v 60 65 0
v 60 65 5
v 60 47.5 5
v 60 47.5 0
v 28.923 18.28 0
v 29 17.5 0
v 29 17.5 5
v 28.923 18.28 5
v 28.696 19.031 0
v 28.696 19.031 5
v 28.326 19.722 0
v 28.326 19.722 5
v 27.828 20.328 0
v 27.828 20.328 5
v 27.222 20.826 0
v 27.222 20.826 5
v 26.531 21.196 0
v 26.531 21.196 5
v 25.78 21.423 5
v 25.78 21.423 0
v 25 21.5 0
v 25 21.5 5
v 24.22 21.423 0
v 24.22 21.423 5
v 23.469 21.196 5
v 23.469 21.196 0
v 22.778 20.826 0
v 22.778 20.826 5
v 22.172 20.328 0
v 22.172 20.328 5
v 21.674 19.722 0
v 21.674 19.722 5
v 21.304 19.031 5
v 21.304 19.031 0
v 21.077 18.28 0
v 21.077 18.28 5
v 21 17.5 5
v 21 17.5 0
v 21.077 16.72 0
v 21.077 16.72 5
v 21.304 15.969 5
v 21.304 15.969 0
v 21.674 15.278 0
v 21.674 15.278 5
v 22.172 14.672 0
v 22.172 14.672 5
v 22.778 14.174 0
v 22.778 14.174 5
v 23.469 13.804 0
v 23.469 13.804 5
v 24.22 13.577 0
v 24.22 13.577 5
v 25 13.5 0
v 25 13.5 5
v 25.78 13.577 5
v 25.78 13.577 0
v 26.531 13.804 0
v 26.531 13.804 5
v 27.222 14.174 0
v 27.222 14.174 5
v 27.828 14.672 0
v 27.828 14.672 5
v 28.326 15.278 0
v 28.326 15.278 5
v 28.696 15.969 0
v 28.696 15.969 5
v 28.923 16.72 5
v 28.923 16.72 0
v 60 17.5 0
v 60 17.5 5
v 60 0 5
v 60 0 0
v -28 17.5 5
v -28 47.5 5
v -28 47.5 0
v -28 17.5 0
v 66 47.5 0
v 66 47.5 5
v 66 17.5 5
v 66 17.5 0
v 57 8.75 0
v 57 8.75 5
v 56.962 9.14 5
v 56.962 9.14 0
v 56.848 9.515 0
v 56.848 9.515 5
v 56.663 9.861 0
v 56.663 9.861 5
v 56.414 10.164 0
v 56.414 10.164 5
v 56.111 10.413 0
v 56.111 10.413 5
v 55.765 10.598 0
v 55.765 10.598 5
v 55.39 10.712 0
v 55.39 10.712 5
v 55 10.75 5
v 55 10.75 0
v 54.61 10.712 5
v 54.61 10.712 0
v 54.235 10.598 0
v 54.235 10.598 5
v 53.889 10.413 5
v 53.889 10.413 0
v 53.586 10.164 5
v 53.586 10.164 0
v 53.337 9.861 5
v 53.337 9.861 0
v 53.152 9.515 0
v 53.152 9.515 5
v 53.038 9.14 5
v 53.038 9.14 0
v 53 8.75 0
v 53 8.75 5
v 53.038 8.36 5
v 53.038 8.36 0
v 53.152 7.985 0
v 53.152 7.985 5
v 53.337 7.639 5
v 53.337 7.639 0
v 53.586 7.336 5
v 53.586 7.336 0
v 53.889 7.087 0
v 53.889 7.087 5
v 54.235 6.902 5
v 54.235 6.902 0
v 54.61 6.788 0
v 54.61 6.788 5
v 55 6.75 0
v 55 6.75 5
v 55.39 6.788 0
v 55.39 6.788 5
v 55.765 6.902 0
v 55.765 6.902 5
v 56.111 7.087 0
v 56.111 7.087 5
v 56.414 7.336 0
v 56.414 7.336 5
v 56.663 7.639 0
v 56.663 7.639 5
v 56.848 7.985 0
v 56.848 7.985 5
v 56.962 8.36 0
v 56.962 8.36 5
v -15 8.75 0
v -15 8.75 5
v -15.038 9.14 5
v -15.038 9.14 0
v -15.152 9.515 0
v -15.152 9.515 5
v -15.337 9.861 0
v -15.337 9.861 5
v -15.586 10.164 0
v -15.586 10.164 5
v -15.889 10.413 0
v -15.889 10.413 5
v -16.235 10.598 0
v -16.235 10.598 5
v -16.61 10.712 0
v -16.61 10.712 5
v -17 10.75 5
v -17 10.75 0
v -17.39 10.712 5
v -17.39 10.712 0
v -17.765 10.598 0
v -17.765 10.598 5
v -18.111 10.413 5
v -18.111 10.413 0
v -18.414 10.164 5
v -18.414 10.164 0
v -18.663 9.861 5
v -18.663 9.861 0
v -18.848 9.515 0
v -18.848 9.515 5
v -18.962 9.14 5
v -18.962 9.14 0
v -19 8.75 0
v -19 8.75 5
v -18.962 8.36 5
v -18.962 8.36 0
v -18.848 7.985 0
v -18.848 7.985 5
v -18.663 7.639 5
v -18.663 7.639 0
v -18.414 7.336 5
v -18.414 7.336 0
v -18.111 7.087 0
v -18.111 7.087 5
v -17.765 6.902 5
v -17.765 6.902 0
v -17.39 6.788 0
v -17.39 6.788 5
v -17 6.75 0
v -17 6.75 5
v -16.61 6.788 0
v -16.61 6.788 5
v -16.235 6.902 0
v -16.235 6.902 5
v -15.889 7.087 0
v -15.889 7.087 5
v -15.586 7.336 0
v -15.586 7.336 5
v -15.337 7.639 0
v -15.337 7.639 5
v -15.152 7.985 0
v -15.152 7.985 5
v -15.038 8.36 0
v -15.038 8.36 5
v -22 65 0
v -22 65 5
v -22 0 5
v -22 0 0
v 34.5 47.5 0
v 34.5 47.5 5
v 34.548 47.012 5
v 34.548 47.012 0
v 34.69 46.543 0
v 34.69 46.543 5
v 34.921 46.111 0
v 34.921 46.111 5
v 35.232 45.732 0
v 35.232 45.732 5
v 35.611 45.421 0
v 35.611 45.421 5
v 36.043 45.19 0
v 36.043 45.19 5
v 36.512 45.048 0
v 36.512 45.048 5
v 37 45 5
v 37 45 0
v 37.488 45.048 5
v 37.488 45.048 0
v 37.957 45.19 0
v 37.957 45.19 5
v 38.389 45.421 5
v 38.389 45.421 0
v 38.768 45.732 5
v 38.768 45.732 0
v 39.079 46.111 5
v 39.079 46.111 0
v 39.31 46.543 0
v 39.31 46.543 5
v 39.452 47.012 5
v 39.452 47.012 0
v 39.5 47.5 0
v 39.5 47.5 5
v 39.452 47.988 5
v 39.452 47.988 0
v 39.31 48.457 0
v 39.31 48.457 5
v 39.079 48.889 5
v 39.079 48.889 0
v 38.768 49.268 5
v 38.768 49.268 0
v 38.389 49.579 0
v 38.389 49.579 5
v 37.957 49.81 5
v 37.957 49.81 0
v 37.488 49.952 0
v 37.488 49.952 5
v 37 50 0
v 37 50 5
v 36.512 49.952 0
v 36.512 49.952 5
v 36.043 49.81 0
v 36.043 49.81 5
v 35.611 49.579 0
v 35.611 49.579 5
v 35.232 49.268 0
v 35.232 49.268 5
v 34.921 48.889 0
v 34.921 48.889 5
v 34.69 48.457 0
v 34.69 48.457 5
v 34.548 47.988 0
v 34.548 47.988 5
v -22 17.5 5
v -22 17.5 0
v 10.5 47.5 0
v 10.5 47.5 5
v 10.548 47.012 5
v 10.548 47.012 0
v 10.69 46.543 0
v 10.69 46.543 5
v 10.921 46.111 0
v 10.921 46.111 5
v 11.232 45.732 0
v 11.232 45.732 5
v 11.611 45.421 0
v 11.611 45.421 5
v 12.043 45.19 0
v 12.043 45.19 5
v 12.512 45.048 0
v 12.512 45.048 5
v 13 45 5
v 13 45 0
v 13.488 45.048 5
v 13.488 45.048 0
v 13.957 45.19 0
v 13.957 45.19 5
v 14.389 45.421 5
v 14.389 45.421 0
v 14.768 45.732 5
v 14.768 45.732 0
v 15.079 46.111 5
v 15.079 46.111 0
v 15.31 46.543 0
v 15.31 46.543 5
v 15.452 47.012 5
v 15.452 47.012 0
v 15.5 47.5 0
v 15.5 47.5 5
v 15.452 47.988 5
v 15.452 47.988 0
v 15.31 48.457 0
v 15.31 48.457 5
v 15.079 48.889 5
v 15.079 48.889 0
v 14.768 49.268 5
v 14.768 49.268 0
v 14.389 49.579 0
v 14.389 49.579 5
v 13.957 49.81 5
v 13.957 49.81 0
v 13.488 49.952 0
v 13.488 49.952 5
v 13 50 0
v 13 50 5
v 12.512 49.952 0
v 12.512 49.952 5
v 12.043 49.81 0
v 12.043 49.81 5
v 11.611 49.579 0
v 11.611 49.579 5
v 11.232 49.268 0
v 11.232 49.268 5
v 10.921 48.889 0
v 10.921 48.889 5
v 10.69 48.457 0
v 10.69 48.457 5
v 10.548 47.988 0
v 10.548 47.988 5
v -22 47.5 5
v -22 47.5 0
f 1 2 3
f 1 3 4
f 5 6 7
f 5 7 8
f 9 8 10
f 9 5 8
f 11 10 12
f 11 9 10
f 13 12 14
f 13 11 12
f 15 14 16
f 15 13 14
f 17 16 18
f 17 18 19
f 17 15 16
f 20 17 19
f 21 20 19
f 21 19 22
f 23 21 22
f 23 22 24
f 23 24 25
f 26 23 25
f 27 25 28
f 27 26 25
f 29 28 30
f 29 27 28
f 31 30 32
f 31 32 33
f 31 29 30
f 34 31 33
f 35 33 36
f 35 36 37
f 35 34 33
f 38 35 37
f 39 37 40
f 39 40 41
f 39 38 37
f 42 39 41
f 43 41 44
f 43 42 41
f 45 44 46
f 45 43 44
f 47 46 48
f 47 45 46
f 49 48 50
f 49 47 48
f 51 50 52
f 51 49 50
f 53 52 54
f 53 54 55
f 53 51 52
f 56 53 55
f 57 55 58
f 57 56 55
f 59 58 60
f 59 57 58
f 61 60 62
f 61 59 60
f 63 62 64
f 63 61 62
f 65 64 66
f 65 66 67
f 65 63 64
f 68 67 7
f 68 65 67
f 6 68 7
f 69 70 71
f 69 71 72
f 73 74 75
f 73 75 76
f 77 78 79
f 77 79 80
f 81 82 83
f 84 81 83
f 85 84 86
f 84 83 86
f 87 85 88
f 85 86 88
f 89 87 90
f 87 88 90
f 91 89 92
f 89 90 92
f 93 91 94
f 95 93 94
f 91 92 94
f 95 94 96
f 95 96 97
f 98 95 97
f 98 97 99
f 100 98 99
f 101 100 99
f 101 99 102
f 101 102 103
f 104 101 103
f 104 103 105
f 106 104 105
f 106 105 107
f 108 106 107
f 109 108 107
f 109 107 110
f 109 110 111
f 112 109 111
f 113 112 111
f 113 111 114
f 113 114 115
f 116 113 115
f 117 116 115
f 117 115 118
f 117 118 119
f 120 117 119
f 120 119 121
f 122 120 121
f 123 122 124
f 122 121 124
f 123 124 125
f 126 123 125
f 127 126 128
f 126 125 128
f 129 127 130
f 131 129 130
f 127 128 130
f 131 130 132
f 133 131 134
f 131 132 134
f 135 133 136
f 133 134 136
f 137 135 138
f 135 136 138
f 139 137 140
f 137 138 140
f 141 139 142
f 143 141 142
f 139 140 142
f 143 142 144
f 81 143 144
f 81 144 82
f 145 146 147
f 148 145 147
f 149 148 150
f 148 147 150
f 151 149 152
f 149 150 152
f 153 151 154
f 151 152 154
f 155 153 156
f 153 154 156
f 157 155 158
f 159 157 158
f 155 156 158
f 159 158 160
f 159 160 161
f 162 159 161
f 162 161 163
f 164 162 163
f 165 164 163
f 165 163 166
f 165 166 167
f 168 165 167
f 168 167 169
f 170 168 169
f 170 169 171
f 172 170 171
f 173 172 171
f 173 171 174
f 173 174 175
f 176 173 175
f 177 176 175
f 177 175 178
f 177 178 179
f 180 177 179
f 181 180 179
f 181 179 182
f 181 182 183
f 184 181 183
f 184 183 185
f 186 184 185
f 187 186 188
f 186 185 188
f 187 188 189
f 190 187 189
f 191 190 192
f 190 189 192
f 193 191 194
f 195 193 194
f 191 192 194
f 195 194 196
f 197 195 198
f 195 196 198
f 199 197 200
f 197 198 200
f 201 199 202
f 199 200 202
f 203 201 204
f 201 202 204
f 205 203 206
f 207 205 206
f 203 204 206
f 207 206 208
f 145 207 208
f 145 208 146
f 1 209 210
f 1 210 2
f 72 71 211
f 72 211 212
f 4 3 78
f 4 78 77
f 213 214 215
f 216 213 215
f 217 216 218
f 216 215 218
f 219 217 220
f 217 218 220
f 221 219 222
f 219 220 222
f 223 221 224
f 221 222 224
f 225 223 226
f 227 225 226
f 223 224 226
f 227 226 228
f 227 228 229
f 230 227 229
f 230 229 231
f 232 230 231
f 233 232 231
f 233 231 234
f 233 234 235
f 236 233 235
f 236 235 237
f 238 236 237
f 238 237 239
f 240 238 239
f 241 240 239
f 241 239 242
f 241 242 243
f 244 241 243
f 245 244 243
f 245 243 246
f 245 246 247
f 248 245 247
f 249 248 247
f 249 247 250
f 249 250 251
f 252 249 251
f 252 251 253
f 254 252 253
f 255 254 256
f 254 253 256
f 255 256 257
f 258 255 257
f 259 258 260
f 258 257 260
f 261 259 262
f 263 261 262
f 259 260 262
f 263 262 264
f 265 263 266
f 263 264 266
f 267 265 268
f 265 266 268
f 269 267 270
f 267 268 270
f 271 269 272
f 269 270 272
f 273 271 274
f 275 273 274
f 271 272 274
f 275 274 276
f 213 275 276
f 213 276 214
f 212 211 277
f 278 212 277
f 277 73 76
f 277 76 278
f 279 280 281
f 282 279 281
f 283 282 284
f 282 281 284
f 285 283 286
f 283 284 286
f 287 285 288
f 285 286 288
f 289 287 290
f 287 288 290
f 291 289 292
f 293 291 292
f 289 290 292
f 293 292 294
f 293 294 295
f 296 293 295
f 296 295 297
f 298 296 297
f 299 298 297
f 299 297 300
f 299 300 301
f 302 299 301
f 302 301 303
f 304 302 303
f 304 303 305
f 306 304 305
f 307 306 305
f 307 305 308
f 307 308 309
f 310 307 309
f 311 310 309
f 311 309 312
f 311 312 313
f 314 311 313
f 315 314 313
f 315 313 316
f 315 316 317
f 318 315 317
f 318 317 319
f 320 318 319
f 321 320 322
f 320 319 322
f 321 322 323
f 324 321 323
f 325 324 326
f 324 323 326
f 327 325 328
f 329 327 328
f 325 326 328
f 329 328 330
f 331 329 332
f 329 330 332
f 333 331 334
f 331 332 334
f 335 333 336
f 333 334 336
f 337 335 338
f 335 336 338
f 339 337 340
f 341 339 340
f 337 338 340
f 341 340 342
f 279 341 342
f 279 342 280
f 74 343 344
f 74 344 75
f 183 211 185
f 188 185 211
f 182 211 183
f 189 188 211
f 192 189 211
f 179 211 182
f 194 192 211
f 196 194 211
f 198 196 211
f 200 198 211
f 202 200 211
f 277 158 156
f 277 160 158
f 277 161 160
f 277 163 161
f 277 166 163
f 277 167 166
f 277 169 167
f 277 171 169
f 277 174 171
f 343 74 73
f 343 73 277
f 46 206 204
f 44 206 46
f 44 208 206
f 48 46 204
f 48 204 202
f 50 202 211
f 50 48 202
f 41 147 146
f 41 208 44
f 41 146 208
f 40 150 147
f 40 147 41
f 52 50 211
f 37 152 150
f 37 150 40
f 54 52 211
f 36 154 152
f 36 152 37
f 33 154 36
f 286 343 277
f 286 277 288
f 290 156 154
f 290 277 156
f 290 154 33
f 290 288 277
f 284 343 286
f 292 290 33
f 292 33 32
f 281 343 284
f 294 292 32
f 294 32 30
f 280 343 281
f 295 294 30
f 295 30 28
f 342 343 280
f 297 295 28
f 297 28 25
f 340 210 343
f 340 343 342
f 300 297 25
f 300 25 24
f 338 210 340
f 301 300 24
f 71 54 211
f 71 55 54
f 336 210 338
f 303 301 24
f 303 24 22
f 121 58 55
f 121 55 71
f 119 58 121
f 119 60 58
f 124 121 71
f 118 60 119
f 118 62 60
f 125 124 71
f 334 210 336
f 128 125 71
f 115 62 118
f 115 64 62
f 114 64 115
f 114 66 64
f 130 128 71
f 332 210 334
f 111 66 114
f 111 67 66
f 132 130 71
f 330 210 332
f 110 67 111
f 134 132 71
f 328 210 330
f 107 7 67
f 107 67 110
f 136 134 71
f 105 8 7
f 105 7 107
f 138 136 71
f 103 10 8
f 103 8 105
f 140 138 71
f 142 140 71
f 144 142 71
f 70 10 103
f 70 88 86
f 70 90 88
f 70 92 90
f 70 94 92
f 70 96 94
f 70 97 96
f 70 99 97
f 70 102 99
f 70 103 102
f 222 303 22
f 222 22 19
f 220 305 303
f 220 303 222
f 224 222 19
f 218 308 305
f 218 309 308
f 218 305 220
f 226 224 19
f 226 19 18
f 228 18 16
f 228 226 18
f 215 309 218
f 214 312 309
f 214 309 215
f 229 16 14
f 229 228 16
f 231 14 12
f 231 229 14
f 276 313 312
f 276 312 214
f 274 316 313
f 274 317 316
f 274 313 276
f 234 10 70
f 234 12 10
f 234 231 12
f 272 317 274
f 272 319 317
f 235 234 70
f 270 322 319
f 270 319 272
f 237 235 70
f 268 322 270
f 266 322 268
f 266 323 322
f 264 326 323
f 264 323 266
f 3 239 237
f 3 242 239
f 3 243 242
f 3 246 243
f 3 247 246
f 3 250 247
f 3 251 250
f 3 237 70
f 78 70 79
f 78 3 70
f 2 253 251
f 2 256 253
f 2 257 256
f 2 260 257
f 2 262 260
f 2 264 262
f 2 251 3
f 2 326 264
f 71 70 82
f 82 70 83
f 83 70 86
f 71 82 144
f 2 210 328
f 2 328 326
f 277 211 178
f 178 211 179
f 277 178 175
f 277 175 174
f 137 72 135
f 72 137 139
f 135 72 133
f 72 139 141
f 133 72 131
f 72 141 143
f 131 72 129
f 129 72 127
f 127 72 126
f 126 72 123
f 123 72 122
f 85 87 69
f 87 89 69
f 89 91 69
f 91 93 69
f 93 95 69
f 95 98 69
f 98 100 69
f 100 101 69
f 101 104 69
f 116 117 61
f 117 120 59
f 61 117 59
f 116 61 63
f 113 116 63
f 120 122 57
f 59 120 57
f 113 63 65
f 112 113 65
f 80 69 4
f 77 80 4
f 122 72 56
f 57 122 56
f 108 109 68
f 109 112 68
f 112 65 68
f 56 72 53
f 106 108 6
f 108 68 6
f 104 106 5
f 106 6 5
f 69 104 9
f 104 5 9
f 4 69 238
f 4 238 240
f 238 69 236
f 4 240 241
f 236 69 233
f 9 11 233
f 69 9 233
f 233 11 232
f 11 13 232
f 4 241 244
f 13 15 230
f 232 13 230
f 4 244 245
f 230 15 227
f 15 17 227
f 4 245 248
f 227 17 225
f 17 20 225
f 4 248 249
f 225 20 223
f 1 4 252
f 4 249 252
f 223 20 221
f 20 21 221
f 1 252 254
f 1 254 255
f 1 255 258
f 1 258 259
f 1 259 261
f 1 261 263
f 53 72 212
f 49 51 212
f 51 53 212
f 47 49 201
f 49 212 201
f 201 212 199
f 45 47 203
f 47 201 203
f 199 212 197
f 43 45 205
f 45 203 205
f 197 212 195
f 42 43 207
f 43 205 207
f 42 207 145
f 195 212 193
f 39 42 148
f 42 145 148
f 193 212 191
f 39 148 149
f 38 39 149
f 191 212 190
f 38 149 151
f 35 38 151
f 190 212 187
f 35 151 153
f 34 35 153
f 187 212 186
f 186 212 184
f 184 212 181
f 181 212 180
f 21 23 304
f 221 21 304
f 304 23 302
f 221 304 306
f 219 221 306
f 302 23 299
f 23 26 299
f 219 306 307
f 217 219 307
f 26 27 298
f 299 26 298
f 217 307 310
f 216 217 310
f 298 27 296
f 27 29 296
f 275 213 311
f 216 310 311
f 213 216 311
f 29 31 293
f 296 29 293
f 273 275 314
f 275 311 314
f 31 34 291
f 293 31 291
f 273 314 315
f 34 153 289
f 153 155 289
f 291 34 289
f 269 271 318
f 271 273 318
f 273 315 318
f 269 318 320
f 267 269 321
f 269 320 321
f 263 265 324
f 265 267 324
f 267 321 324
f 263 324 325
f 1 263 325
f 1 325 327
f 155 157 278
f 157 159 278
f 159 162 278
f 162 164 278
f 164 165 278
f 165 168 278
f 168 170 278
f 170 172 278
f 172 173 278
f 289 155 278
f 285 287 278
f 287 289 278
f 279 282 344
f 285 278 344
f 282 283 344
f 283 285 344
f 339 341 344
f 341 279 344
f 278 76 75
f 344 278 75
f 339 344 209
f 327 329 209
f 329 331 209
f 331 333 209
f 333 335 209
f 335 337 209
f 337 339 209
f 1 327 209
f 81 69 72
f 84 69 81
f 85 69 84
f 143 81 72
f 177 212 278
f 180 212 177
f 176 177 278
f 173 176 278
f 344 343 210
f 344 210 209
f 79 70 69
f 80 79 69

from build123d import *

# Parameters (mm, degrees)
SKETCH2_W            = 50
SKETCH2_H            = 65
SKETCH2_R            = 2
SKETCH2_R_2          = 4
BOSS_EXTRUDE1_DEPTH  = 5
SKETCH3_W            = 21
SKETCH3_H            = 65
BOSS_EXTRUDE2_DEPTH  = 5
SKETCH4_W            = 1
SKETCH4_H            = 65
BOSS_EXTRUDE3_DEPTH  = 5
BOSS_EXTRUDE4_DEPTH  = 5
SKETCH6_R            = 2
CUT_EXTRUDE1_DEPTH   = 59
SKETCH7_R            = 1.5
CUT_EXTRUDE2_DEPTH   = 10
SKETCH7_4_R          = 1.5
CUT_EXTRUDE3_DEPTH   = 10
SKETCH7_5_R          = 1.5
BOSS_EXTRUDE5_DEPTH  = 5
SKETCH8_R            = 2
CUT_EXTRUDE4_DEPTH   = 10
SKETCH9_R            = 2.5
CUT_EXTRUDE5_DEPTH   = 10
SKETCH10_R           = 2.5
BOSS_EXTRUDE6_DEPTH  = 5
SKETCH10_4_R         = 2.5
CUT_EXTRUDE6_DEPTH   = 10
SKETCH11_W           = 72
SKETCH11_H           = 5
BOSS_EXTRUDE7_DEPTH  = 10
SKETCH12_W           = 5
SKETCH12_H           = 17.5
BOSS_EXTRUDE8_DEPTH  = 10
SKETCH14_W           = 5
SKETCH14_H           = 27.5
BOSS_EXTRUDE9_DEPTH  = 10
SKETCH13_W           = 5
SKETCH13_H           = 30
BOSS_EXTRUDE10_DEPTH = 10
SKETCH17_R           = 2
BOSS_EXTRUDE11_DEPTH = 5
SKETCH17_3_R         = 2
CUT_EXTRUDE7_DEPTH   = 10
SKETCH18_W           = 82
SKETCH18_H           = 5
CUT_EXTRUDE8_DEPTH   = 10
SKETCH19_R           = 2.5
BOSS_EXTRUDE12_DEPTH = 5
CUT_EXTRUDE9_DEPTH   = 10


with BuildPart() as part:
    # Sketch2 → Boss-Extrude1 (new body)
    with BuildSketch(Plane.XY):
        with Locations((25, 32.5)):
            Rectangle(SKETCH2_W, SKETCH2_H)
        with Locations((25, 59.5)):
            Circle(SKETCH2_R, mode=Mode.SUBTRACT)
        with Locations((13, 47.5)):
            Circle(SKETCH2_R, mode=Mode.SUBTRACT)
        with Locations((37, 47.5)):
            Circle(SKETCH2_R, mode=Mode.SUBTRACT)
        with Locations((25, 17.5)):
            Circle(SKETCH2_R_2, mode=Mode.SUBTRACT)
    extrude(amount=BOSS_EXTRUDE1_DEPTH)

    # Sketch3 → Boss-Extrude2 (add)
    with BuildSketch(Plane.XY.offset(5)):
        with Locations((-10.5, 32.5)):
            Rectangle(SKETCH3_W, SKETCH3_H)
    extrude(amount=-BOSS_EXTRUDE2_DEPTH)

    # Sketch4 → Boss-Extrude3 (add)
    with BuildSketch(Plane.XY.offset(5)):
        with Locations((-21.5, 32.5)):
            Rectangle(SKETCH4_W, SKETCH4_H)
    extrude(amount=-BOSS_EXTRUDE3_DEPTH)

    # Sketch5 → Boss-Extrude4 (add)
    with BuildSketch(Plane.XY.offset(5)):
        Polygon((-22, 17.5), (-22, 32.5), (-22, 47.5), (-28, 47.5), (-28, 17.5), align=None)
        Polygon((56, 17.5), (56, 47.5), (50, 47.5), (50, 32.5), (50, 17.5), align=None)
    extrude(amount=-BOSS_EXTRUDE4_DEPTH)

    # Sketch6 → Cut-Extrude1 (cut)
    with BuildSketch(Plane.XY.offset(5)):
        with Locations((25, 35.5)):
            Circle(SKETCH6_R)
    extrude(amount=-CUT_EXTRUDE1_DEPTH, mode=Mode.SUBTRACT)

    # Sketch7 → Cut-Extrude2 (cut)
    with BuildSketch(Plane.XY.offset(5)):
        with Locations((-17, 56.25)):
            Circle(SKETCH7_R)
        with Locations((45, 56.25)):
            Circle(SKETCH7_R)
    extrude(amount=-CUT_EXTRUDE2_DEPTH, mode=Mode.SUBTRACT)

    # Sketch7<4> → Cut-Extrude3 (cut)
    with BuildSketch(Plane.XY.offset(5)):
        with Locations((45, 8.75)):
            Circle(SKETCH7_4_R)
        with Locations((-17, 8.75)):
            Circle(SKETCH7_4_R)
    extrude(amount=-CUT_EXTRUDE3_DEPTH, mode=Mode.SUBTRACT)

    # Sketch7<5> → Boss-Extrude5 (add)
    with BuildSketch(Plane.XY.offset(5)):
        with Locations((-17, 56.25)):
            Circle(SKETCH7_5_R)
        with Locations((45, 56.25)):
            Circle(SKETCH7_5_R)
    extrude(amount=-BOSS_EXTRUDE5_DEPTH)

    # Sketch8 → Cut-Extrude4 (cut)
    with BuildSketch(Plane.XY.offset(5)):
        with Locations((-17, 8.75)):
            Circle(SKETCH8_R)
        with Locations((45, 8.75)):
            Circle(SKETCH8_R)
    extrude(amount=-CUT_EXTRUDE4_DEPTH, mode=Mode.SUBTRACT)

    # Sketch9 → Cut-Extrude5 (cut)
    with BuildSketch(Plane.XY.offset(5)):
        with Locations((25, 59.5)):
            Circle(SKETCH9_R)
        with Locations((25, 35.5)):
            Circle(SKETCH9_R)
        with Locations((13, 47.5)):
            Circle(SKETCH9_R)
        with Locations((37, 47.5)):
            Circle(SKETCH9_R)
    extrude(amount=-CUT_EXTRUDE5_DEPTH, mode=Mode.SUBTRACT)

    # Sketch10 → Boss-Extrude6 (add)
    with BuildSketch(Plane.XY.offset(5)):
        with BuildLine():
            Line((10.5, 47.5), (13, 47.5))
            Line((13, 47.5), (15.5, 47.5))
            ThreePointArc((15.5, 47.5), (13, 50), (10.5, 47.5))
        make_face()
        with BuildLine():
            Line((15.5, 47.5), (13, 47.5))
            Line((13, 47.5), (10.5, 47.5))
            ThreePointArc((10.5, 47.5), (13, 45), (15.5, 47.5))
        make_face()
        with Locations((25, 59.5)):
            Circle(SKETCH10_R)
        with BuildLine():
            ThreePointArc((39.5, 47.5), (37, 50), (34.5, 47.5))
            Line((34.5, 47.5), (37, 47.5))
            Line((37, 47.5), (39.5, 47.5))
        make_face()
        with BuildLine():
            Line((37, 47.5), (34.5, 47.5))
            ThreePointArc((34.5, 47.5), (37, 45), (39.5, 47.5))
            Line((39.5, 47.5), (37, 47.5))
        make_face()
        with Locations((25, 35.5)):
            Circle(SKETCH10_R)
    extrude(amount=-BOSS_EXTRUDE6_DEPTH)

    # Sketch10<4> → Cut-Extrude6 (cut)
    with BuildSketch(Plane.XY.offset(5)):
        with Locations((6.5, 47.5)):
            Circle(SKETCH10_4_R)
        with Locations((43.5, 47.5)):
            Circle(SKETCH10_4_R)
    extrude(amount=-CUT_EXTRUDE6_DEPTH, mode=Mode.SUBTRACT)

    # Sketch11 → Boss-Extrude7 (add)
    with BuildSketch(Plane(origin=(0, 65, 0), x_dir=(1, 0, 0), z_dir=(0, 1, 0))):
        with Locations((14, -2.5)):
            Rectangle(SKETCH11_W, SKETCH11_H)
    extrude(amount=BOSS_EXTRUDE7_DEPTH)

    # Sketch12 → Boss-Extrude8 (add)
    with BuildSketch(Plane(origin=(50, 0, 0), x_dir=(0, 0, -1), z_dir=(1, 0, 0))):
        with Locations((-2.5, 8.75)):
            Rectangle(SKETCH12_W, SKETCH12_H)
    extrude(amount=BOSS_EXTRUDE8_DEPTH)

    # Sketch14 → Boss-Extrude9 (add)
    with BuildSketch(Plane(origin=(50, 0, 0), x_dir=(0, 0, -1), z_dir=(1, 0, 0))):
        with Locations((-2.5, 61.25)):
            Rectangle(SKETCH14_W, SKETCH14_H)
    extrude(amount=BOSS_EXTRUDE9_DEPTH)

    # Sketch13 → Boss-Extrude10 (add)
    with BuildSketch(Plane(origin=(56, 0, 0), x_dir=(0, 0, -1), z_dir=(1, 0, 0))):
        with Locations((-2.5, 32.5)):
            Rectangle(SKETCH13_W, SKETCH13_H)
    extrude(amount=BOSS_EXTRUDE10_DEPTH)

    # Sketch17 → Boss-Extrude11 (add)
    with BuildSketch(Plane.XY.offset(5)):
        with Locations((45, 8.75)):
            Circle(SKETCH17_R)
        with Locations((55, 8.75)):
            Circle(SKETCH17_R)
    extrude(amount=-BOSS_EXTRUDE11_DEPTH)

    # Sketch17<3> → Cut-Extrude7 (cut)
    with BuildSketch(Plane.XY.offset(5)):
        with Locations((55, 8.75)):
            Circle(SKETCH17_3_R)
    extrude(amount=-CUT_EXTRUDE7_DEPTH, mode=Mode.SUBTRACT)

    # Sketch18 → Cut-Extrude8 (cut)
    with BuildSketch(Plane(origin=(0, 75, 0), x_dir=(1, 0, 0), z_dir=(0, 1, 0))):
        with Locations((19, -2.5)):
            Rectangle(SKETCH18_W, SKETCH18_H)
    extrude(amount=-CUT_EXTRUDE8_DEPTH, mode=Mode.SUBTRACT)

    # Sketch19 → Boss-Extrude12 (add)
    with BuildSketch(Plane.XY.offset(5)):
        with Locations((6.5, 47.5)):
            Circle(SKETCH19_R)
        with Locations((13, 47.5)):
            Circle(SKETCH19_R)
        with Locations((37, 47.5)):
            Circle(SKETCH19_R)
        with Locations((43.5, 47.5)):
            Circle(SKETCH19_R)
    extrude(amount=-BOSS_EXTRUDE12_DEPTH)

    # Sketch19<3> → Cut-Extrude9 (cut)
    with BuildSketch(Plane.XY.offset(5)):
        with BuildLine():
            Line((10.5, 47.5), (13, 47.5))
            Line((13, 47.5), (15.5, 47.5))
            ThreePointArc((15.5, 47.5), (13, 50), (10.5, 47.5))
        make_face()
        with BuildLine():
            Line((15.5, 47.5), (13, 47.5))
            Line((13, 47.5), (10.5, 47.5))
            ThreePointArc((10.5, 47.5), (13, 45), (15.5, 47.5))
        make_face()
        with BuildLine():
            ThreePointArc((39.5, 47.5), (37, 50), (34.5, 47.5))
            Line((34.5, 47.5), (37, 47.5))
            Line((37, 47.5), (39.5, 47.5))
        make_face()
        with BuildLine():
            Line((37, 47.5), (34.5, 47.5))
            ThreePointArc((34.5, 47.5), (37, 45), (39.5, 47.5))
            Line((39.5, 47.5), (37, 47.5))
        make_face()
    extrude(amount=-CUT_EXTRUDE9_DEPTH, mode=Mode.SUBTRACT)


solid = part.part
